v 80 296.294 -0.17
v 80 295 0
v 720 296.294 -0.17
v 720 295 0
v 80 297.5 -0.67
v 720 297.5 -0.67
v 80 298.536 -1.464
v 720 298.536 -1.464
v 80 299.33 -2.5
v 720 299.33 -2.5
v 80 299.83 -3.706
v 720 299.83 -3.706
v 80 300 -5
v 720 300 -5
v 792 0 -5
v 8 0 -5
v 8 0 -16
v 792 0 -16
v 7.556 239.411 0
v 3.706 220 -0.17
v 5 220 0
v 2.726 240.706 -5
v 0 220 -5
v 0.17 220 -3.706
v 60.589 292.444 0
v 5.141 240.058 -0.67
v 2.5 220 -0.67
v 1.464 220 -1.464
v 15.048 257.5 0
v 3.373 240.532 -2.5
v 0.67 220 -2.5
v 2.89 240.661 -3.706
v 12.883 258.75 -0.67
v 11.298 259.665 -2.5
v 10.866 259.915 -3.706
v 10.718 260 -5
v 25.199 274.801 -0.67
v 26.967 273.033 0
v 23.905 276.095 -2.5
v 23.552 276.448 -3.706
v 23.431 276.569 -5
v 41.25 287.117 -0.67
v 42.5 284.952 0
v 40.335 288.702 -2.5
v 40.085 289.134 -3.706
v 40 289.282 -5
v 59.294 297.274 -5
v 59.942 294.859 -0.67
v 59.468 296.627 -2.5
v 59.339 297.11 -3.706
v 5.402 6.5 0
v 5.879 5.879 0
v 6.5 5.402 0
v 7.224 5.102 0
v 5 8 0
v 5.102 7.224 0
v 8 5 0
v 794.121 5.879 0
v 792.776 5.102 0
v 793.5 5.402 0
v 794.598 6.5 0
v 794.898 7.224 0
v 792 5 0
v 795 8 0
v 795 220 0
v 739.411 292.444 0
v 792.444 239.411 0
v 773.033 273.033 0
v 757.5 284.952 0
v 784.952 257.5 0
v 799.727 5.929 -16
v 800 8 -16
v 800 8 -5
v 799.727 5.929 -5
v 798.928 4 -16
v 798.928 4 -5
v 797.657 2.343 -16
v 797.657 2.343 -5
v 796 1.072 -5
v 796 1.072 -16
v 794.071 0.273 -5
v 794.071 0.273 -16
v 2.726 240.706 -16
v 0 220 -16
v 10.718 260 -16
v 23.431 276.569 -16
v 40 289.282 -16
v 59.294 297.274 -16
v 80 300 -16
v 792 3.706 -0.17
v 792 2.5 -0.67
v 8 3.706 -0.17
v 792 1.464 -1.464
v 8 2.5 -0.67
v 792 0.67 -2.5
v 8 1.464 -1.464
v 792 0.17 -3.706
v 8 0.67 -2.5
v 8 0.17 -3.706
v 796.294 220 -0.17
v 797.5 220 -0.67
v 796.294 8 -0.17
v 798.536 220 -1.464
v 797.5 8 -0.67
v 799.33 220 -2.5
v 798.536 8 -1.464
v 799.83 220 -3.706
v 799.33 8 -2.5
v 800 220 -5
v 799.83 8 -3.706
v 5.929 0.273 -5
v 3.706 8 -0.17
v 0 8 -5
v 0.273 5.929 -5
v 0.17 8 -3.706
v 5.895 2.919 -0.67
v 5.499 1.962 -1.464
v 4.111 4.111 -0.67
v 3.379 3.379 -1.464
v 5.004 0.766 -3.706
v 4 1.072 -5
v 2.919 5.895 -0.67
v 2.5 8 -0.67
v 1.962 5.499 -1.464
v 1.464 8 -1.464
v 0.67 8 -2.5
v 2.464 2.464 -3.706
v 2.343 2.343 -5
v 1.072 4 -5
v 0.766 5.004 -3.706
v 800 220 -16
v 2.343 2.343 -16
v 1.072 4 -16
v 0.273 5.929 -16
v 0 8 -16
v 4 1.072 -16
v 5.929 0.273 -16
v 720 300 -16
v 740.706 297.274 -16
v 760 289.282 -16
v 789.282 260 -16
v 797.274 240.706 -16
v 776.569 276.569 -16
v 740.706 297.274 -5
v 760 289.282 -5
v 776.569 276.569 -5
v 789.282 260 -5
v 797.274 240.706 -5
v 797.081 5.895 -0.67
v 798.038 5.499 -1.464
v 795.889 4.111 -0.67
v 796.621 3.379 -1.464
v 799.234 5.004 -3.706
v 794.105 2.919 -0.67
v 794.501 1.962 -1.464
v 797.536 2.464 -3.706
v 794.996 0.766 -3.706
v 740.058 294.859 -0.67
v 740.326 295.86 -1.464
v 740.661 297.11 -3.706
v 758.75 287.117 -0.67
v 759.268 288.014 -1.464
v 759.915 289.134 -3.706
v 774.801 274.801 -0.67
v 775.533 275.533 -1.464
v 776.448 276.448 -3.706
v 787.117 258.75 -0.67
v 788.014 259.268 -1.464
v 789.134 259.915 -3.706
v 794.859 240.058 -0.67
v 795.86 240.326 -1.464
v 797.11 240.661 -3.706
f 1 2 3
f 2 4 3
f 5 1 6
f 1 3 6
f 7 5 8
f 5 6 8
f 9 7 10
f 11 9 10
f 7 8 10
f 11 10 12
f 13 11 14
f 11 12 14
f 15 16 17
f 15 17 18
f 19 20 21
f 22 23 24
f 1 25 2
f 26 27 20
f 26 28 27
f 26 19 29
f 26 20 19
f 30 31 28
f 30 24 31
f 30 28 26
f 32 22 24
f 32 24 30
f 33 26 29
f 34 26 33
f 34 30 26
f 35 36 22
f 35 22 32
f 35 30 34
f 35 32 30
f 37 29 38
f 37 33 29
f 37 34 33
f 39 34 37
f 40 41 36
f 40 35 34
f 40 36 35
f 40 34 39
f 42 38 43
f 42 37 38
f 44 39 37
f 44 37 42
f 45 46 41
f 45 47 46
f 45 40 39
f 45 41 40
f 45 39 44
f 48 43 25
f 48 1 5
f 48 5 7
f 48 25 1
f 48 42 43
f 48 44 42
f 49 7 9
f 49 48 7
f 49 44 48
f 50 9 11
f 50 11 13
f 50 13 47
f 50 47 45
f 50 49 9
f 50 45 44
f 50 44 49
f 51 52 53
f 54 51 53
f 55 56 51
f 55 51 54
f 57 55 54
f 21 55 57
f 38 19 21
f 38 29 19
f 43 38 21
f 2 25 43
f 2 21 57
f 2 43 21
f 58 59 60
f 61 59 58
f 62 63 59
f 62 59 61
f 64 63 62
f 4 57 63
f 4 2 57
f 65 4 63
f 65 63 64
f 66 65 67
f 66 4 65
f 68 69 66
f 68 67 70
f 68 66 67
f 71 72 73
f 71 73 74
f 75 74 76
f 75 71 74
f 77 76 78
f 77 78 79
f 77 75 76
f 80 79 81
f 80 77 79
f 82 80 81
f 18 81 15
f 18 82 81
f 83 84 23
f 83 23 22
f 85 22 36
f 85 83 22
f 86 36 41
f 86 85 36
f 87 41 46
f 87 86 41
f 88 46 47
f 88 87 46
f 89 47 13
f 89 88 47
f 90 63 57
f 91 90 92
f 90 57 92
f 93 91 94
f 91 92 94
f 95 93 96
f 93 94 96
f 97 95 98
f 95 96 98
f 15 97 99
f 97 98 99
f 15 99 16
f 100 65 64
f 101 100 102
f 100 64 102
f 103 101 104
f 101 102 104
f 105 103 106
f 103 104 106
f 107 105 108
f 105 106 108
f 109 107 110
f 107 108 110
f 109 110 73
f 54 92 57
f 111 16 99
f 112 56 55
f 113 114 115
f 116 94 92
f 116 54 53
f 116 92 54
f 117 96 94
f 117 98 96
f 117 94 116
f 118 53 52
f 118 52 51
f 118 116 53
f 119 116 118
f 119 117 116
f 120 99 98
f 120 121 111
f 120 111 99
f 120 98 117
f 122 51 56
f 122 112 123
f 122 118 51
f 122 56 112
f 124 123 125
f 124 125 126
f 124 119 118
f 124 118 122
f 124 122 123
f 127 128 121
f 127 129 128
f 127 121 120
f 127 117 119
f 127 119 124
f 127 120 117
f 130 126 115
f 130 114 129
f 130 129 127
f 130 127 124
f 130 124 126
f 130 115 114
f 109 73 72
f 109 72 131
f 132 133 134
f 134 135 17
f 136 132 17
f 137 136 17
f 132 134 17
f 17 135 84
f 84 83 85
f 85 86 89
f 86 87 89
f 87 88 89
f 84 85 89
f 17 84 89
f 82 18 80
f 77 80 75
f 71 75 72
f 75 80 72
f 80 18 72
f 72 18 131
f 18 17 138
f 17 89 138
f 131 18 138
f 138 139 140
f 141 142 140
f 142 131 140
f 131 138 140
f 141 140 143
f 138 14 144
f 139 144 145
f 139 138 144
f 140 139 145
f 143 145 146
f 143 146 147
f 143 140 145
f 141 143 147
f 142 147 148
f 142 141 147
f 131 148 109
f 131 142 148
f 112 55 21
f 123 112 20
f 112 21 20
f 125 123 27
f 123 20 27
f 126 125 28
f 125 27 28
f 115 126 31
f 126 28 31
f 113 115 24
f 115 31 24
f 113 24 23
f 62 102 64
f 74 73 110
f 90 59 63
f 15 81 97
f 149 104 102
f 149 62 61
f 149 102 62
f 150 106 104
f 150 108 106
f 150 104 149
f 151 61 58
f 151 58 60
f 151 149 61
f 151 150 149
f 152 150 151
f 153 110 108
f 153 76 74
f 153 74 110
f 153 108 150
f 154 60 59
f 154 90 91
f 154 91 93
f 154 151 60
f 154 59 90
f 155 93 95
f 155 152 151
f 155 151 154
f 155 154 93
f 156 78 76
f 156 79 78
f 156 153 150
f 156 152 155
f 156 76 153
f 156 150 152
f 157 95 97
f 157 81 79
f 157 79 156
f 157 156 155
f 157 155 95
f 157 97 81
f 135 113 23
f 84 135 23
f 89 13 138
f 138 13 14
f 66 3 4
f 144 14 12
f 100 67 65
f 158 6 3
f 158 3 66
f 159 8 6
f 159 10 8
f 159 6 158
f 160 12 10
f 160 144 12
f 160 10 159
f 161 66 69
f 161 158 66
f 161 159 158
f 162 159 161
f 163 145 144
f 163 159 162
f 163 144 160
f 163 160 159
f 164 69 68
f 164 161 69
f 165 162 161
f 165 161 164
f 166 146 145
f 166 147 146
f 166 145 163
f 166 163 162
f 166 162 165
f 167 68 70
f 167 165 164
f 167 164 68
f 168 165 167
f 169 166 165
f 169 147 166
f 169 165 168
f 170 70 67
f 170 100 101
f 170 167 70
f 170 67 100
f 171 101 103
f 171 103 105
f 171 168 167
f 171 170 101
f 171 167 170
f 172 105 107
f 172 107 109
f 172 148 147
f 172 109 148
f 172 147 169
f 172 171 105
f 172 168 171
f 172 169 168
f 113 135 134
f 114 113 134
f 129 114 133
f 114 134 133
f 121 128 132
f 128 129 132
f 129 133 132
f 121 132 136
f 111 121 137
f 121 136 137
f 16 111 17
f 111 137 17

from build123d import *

# Parameters (mm, degrees)
F0_W     = 800
F0_H     = 300
F1_DEPTH = 16
F2_R     = 80
F3_R     = 80
F4_R     = 8
F5_R     = 5


with BuildPart() as f1:
    # F0 (on Top) → F1 (new body)
    with BuildSketch(Plane.XY):
        with Locations((400, 150)):
            Rectangle(F0_W, F0_H)
    extrude(amount=-F1_DEPTH)

    # F2
    f2_edges = [f1.edges().sort_by_distance(p)[0] for p in [
        (0, 300, -8),
    ]]
    fillet(f2_edges, radius=F2_R)

    # F3
    f3_edges = [f1.edges().sort_by_distance(p)[0] for p in [
        (800, 300, -8),
    ]]
    fillet(f3_edges, radius=F3_R)

    # F4
    f4_edges = [f1.edges().sort_by_distance(p)[0] for p in [
        (800, 0, -8),
        (0, 0, -8),
    ]]
    fillet(f4_edges, radius=F4_R)

    # F5
    f5_edges = [f1.edges().sort_by_distance(p)[0] for p in [
        (400, 300, 0),
    ]]
    fillet(f5_edges, radius=F5_R)


solid = f1.part
